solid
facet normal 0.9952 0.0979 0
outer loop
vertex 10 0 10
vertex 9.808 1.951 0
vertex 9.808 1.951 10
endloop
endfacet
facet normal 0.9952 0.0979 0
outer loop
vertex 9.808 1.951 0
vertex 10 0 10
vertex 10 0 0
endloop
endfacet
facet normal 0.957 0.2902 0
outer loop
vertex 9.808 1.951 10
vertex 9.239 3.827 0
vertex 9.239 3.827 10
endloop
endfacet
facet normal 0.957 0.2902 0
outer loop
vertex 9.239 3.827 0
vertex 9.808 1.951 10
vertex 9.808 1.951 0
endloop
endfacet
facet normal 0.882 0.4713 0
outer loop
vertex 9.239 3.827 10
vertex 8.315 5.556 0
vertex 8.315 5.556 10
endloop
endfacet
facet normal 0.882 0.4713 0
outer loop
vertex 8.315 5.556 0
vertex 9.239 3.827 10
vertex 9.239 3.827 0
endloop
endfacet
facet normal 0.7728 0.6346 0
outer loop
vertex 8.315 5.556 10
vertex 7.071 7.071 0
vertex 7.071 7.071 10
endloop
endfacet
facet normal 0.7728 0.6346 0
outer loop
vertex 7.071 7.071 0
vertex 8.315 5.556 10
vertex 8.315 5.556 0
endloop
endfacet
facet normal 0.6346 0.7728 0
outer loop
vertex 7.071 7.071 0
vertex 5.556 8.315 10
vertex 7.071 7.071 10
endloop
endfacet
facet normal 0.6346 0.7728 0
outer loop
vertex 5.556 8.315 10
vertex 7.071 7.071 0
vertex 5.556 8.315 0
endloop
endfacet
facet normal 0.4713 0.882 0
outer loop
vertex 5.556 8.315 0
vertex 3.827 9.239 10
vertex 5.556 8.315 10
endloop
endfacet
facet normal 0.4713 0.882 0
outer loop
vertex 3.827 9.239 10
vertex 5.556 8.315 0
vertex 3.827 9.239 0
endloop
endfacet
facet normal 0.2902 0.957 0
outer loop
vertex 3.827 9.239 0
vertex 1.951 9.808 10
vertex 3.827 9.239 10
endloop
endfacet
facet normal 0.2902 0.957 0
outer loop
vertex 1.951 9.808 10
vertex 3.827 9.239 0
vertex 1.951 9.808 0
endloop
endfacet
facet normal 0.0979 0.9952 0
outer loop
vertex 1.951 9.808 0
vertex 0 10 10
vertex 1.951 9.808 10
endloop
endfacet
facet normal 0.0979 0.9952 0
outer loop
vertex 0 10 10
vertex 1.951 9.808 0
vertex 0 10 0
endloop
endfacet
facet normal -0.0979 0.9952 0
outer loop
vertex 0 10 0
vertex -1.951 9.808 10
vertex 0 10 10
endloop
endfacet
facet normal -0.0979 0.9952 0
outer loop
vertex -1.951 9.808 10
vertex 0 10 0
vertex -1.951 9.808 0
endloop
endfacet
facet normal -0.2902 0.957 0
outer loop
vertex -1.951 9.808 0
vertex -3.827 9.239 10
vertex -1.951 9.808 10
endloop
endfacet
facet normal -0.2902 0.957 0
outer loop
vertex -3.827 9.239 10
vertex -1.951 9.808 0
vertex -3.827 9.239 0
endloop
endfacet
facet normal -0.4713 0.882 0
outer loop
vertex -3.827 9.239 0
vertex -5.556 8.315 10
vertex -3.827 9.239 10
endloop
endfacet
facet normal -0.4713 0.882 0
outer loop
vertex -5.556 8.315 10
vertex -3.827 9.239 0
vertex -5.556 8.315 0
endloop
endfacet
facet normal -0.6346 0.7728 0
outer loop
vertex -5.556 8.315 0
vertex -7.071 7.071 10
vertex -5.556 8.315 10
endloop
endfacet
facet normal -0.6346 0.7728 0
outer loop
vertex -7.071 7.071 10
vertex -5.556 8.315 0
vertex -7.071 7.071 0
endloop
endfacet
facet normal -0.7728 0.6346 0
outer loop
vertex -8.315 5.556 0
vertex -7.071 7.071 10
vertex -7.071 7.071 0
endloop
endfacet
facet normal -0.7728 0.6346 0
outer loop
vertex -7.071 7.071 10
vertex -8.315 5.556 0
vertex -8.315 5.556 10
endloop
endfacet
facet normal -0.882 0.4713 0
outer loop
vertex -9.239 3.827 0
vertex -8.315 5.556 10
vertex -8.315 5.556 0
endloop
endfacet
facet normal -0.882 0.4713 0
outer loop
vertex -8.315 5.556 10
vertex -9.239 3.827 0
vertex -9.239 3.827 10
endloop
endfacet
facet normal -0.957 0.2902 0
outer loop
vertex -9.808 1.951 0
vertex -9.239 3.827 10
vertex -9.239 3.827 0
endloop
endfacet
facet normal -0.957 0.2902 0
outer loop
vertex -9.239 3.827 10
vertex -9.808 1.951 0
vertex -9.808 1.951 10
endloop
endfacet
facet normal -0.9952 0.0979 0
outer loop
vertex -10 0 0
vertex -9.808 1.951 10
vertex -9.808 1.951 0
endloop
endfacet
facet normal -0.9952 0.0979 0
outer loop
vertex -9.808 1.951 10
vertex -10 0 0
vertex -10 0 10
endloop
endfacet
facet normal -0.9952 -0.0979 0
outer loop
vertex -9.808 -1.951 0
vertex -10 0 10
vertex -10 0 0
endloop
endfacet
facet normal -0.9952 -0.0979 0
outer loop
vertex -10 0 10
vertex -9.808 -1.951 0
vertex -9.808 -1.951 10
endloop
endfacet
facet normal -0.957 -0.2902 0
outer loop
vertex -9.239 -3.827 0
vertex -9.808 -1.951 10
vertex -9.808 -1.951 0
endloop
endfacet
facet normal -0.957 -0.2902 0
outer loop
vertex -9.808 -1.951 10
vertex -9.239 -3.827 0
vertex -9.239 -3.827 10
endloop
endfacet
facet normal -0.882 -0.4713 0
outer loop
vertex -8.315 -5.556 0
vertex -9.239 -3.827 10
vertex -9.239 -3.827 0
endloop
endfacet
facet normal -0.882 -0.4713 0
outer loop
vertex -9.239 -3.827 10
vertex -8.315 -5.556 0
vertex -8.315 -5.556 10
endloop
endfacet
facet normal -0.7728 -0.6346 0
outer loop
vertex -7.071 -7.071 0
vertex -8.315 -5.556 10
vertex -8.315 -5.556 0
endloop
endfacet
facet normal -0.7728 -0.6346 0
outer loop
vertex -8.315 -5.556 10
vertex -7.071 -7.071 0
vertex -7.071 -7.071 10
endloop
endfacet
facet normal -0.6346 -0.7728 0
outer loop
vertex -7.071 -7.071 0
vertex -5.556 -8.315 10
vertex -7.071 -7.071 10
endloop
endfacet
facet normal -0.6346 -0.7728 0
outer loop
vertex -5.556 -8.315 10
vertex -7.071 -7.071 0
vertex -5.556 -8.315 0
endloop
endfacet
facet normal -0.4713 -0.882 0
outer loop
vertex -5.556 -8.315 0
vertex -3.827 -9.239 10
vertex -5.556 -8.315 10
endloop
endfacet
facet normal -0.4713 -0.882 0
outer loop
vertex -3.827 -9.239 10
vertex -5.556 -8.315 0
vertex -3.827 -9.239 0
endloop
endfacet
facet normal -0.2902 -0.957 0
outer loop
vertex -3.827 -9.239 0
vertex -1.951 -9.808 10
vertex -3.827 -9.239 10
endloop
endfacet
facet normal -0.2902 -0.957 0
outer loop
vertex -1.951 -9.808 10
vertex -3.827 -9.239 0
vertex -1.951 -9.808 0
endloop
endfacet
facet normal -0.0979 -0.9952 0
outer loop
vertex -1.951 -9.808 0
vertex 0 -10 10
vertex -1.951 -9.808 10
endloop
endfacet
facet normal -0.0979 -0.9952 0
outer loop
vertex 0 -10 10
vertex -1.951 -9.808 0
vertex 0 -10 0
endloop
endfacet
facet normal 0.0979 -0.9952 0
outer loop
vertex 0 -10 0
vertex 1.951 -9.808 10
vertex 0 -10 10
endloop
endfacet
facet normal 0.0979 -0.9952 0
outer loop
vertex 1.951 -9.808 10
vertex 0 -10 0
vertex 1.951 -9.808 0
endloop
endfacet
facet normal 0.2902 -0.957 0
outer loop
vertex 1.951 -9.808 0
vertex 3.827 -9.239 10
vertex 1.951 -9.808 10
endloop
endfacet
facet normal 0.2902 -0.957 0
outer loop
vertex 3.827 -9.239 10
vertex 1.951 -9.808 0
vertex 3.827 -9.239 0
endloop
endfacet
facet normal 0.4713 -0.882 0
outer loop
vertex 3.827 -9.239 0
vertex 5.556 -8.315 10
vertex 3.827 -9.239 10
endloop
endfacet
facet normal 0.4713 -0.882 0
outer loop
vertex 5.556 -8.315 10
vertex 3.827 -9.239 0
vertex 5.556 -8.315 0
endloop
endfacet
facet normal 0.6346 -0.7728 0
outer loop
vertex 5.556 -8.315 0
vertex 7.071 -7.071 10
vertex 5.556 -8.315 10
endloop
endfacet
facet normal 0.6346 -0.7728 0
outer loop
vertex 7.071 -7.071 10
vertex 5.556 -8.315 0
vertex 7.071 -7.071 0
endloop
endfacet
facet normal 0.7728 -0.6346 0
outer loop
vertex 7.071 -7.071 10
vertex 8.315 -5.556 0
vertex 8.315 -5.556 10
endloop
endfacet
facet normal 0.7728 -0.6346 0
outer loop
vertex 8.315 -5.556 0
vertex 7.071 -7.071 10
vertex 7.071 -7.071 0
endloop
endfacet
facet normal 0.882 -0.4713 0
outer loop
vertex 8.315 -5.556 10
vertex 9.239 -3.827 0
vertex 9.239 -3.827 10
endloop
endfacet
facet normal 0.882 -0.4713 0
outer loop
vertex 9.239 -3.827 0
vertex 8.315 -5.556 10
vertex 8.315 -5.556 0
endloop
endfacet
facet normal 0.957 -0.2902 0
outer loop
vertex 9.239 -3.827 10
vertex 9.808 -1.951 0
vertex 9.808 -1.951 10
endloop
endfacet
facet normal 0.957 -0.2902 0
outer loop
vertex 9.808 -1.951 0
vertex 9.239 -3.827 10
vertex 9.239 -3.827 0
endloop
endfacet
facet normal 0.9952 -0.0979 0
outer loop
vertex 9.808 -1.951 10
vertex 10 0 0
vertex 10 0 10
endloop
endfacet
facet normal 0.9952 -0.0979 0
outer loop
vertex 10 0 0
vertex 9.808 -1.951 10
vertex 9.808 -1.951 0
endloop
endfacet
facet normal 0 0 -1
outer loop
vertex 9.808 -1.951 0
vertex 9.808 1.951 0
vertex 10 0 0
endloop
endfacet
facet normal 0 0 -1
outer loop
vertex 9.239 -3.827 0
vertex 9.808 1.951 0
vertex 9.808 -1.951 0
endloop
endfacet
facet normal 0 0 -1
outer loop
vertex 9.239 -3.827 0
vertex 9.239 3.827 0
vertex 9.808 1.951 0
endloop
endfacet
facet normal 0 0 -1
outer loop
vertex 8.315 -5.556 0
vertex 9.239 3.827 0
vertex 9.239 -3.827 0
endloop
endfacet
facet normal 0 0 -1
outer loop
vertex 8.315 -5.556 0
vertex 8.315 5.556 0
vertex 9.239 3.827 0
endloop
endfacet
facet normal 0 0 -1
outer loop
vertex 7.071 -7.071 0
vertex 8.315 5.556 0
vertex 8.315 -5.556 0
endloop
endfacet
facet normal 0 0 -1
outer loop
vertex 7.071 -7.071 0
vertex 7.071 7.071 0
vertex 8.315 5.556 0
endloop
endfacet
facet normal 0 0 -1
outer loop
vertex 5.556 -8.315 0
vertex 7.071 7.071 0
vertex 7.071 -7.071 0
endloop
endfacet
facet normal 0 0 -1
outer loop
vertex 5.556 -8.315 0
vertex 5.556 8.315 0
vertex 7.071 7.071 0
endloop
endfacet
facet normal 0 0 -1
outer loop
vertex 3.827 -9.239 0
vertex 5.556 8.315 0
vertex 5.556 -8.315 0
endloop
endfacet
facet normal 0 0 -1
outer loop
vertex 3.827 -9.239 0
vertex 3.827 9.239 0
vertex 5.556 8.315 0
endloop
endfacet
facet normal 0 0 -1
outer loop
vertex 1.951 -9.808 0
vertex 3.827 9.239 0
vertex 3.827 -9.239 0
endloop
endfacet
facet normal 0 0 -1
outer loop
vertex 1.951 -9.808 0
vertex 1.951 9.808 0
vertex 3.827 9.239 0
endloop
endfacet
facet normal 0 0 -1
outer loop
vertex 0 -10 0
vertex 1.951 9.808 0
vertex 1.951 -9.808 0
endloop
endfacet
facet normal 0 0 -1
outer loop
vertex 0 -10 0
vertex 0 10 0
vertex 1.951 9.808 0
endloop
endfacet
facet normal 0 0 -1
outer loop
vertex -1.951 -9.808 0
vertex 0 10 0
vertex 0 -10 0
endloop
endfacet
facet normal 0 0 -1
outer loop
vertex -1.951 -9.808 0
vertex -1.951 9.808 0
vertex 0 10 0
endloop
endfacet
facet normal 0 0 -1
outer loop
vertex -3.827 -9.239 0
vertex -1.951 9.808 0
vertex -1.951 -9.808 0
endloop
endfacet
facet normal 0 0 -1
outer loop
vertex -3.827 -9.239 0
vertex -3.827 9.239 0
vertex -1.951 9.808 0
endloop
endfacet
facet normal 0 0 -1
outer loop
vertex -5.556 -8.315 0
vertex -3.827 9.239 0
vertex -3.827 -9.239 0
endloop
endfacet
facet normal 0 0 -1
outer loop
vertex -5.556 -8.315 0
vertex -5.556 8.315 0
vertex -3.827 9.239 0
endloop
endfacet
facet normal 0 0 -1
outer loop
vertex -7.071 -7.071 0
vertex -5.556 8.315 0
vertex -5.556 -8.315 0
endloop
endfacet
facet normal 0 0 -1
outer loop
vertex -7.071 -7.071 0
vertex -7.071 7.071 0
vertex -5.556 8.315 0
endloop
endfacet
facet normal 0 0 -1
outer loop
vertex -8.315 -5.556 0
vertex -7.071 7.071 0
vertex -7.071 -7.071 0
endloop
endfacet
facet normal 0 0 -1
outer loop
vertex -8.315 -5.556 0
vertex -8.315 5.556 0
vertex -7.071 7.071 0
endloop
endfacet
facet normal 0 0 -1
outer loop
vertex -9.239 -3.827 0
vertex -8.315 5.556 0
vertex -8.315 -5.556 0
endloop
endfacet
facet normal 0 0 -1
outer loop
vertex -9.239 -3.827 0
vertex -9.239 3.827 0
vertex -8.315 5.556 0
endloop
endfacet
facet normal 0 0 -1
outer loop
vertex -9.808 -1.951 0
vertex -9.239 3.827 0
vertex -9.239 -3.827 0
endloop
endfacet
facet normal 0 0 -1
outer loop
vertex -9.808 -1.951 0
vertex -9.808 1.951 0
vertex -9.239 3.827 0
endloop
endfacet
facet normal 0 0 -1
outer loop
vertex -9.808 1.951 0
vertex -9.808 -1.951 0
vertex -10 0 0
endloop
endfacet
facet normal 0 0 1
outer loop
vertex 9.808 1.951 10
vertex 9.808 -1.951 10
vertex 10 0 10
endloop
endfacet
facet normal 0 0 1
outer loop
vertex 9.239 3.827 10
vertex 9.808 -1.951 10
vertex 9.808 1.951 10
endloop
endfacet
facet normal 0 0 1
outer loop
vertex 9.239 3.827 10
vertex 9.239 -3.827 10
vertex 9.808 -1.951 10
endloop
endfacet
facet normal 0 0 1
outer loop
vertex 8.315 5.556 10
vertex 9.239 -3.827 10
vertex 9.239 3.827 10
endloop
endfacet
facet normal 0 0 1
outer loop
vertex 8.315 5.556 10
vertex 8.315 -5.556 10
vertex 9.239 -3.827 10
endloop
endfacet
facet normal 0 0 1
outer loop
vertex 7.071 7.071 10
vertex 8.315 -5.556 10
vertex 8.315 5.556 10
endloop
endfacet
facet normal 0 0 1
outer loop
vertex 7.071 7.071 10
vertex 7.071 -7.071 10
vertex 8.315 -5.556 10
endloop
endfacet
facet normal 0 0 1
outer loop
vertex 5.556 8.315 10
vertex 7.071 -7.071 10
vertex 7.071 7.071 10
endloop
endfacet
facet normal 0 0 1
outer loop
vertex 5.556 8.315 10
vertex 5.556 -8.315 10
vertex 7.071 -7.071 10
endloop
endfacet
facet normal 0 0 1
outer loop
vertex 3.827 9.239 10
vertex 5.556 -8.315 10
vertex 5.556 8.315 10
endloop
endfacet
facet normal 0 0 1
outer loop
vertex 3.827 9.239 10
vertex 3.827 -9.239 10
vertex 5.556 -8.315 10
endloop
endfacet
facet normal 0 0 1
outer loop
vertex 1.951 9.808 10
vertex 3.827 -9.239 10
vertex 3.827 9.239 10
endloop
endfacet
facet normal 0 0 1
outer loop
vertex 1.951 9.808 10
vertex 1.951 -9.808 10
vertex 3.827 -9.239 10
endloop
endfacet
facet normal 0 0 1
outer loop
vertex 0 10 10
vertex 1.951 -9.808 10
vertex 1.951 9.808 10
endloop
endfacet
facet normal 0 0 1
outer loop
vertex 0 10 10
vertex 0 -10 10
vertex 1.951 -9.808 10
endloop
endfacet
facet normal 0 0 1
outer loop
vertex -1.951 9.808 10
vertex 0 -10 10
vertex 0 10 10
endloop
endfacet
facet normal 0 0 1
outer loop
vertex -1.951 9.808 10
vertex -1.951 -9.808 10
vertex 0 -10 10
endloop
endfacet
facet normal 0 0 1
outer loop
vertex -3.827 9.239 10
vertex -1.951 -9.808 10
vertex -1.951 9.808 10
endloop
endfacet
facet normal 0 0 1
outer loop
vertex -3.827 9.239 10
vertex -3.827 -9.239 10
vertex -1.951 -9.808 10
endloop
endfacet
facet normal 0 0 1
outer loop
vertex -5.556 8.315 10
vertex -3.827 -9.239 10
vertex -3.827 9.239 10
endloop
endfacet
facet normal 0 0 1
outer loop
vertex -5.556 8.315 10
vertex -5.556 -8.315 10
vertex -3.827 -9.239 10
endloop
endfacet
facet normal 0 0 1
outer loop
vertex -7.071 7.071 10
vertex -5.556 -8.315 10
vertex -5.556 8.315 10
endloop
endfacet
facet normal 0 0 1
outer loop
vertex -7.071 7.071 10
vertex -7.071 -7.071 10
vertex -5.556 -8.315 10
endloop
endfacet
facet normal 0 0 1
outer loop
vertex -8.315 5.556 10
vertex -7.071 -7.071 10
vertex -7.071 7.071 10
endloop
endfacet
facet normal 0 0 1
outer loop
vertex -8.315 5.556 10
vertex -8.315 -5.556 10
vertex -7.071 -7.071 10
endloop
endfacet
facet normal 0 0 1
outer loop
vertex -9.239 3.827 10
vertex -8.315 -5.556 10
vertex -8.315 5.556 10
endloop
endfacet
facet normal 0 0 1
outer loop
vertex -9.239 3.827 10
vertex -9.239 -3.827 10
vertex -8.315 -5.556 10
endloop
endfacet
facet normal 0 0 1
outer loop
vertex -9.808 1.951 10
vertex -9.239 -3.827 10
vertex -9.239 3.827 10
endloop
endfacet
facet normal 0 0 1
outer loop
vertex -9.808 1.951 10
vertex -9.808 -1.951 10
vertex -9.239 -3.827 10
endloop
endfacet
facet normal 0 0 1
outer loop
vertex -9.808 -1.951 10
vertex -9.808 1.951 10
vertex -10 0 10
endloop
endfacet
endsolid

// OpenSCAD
SH_D1=16;
SH_D2=20;
SH_L=20;
SH_H=10;

module showerHangerTop() {
    $fn=32;
    cylinder(d=SH_D2,h=SH_H);
    
}

showerHangerTop();
